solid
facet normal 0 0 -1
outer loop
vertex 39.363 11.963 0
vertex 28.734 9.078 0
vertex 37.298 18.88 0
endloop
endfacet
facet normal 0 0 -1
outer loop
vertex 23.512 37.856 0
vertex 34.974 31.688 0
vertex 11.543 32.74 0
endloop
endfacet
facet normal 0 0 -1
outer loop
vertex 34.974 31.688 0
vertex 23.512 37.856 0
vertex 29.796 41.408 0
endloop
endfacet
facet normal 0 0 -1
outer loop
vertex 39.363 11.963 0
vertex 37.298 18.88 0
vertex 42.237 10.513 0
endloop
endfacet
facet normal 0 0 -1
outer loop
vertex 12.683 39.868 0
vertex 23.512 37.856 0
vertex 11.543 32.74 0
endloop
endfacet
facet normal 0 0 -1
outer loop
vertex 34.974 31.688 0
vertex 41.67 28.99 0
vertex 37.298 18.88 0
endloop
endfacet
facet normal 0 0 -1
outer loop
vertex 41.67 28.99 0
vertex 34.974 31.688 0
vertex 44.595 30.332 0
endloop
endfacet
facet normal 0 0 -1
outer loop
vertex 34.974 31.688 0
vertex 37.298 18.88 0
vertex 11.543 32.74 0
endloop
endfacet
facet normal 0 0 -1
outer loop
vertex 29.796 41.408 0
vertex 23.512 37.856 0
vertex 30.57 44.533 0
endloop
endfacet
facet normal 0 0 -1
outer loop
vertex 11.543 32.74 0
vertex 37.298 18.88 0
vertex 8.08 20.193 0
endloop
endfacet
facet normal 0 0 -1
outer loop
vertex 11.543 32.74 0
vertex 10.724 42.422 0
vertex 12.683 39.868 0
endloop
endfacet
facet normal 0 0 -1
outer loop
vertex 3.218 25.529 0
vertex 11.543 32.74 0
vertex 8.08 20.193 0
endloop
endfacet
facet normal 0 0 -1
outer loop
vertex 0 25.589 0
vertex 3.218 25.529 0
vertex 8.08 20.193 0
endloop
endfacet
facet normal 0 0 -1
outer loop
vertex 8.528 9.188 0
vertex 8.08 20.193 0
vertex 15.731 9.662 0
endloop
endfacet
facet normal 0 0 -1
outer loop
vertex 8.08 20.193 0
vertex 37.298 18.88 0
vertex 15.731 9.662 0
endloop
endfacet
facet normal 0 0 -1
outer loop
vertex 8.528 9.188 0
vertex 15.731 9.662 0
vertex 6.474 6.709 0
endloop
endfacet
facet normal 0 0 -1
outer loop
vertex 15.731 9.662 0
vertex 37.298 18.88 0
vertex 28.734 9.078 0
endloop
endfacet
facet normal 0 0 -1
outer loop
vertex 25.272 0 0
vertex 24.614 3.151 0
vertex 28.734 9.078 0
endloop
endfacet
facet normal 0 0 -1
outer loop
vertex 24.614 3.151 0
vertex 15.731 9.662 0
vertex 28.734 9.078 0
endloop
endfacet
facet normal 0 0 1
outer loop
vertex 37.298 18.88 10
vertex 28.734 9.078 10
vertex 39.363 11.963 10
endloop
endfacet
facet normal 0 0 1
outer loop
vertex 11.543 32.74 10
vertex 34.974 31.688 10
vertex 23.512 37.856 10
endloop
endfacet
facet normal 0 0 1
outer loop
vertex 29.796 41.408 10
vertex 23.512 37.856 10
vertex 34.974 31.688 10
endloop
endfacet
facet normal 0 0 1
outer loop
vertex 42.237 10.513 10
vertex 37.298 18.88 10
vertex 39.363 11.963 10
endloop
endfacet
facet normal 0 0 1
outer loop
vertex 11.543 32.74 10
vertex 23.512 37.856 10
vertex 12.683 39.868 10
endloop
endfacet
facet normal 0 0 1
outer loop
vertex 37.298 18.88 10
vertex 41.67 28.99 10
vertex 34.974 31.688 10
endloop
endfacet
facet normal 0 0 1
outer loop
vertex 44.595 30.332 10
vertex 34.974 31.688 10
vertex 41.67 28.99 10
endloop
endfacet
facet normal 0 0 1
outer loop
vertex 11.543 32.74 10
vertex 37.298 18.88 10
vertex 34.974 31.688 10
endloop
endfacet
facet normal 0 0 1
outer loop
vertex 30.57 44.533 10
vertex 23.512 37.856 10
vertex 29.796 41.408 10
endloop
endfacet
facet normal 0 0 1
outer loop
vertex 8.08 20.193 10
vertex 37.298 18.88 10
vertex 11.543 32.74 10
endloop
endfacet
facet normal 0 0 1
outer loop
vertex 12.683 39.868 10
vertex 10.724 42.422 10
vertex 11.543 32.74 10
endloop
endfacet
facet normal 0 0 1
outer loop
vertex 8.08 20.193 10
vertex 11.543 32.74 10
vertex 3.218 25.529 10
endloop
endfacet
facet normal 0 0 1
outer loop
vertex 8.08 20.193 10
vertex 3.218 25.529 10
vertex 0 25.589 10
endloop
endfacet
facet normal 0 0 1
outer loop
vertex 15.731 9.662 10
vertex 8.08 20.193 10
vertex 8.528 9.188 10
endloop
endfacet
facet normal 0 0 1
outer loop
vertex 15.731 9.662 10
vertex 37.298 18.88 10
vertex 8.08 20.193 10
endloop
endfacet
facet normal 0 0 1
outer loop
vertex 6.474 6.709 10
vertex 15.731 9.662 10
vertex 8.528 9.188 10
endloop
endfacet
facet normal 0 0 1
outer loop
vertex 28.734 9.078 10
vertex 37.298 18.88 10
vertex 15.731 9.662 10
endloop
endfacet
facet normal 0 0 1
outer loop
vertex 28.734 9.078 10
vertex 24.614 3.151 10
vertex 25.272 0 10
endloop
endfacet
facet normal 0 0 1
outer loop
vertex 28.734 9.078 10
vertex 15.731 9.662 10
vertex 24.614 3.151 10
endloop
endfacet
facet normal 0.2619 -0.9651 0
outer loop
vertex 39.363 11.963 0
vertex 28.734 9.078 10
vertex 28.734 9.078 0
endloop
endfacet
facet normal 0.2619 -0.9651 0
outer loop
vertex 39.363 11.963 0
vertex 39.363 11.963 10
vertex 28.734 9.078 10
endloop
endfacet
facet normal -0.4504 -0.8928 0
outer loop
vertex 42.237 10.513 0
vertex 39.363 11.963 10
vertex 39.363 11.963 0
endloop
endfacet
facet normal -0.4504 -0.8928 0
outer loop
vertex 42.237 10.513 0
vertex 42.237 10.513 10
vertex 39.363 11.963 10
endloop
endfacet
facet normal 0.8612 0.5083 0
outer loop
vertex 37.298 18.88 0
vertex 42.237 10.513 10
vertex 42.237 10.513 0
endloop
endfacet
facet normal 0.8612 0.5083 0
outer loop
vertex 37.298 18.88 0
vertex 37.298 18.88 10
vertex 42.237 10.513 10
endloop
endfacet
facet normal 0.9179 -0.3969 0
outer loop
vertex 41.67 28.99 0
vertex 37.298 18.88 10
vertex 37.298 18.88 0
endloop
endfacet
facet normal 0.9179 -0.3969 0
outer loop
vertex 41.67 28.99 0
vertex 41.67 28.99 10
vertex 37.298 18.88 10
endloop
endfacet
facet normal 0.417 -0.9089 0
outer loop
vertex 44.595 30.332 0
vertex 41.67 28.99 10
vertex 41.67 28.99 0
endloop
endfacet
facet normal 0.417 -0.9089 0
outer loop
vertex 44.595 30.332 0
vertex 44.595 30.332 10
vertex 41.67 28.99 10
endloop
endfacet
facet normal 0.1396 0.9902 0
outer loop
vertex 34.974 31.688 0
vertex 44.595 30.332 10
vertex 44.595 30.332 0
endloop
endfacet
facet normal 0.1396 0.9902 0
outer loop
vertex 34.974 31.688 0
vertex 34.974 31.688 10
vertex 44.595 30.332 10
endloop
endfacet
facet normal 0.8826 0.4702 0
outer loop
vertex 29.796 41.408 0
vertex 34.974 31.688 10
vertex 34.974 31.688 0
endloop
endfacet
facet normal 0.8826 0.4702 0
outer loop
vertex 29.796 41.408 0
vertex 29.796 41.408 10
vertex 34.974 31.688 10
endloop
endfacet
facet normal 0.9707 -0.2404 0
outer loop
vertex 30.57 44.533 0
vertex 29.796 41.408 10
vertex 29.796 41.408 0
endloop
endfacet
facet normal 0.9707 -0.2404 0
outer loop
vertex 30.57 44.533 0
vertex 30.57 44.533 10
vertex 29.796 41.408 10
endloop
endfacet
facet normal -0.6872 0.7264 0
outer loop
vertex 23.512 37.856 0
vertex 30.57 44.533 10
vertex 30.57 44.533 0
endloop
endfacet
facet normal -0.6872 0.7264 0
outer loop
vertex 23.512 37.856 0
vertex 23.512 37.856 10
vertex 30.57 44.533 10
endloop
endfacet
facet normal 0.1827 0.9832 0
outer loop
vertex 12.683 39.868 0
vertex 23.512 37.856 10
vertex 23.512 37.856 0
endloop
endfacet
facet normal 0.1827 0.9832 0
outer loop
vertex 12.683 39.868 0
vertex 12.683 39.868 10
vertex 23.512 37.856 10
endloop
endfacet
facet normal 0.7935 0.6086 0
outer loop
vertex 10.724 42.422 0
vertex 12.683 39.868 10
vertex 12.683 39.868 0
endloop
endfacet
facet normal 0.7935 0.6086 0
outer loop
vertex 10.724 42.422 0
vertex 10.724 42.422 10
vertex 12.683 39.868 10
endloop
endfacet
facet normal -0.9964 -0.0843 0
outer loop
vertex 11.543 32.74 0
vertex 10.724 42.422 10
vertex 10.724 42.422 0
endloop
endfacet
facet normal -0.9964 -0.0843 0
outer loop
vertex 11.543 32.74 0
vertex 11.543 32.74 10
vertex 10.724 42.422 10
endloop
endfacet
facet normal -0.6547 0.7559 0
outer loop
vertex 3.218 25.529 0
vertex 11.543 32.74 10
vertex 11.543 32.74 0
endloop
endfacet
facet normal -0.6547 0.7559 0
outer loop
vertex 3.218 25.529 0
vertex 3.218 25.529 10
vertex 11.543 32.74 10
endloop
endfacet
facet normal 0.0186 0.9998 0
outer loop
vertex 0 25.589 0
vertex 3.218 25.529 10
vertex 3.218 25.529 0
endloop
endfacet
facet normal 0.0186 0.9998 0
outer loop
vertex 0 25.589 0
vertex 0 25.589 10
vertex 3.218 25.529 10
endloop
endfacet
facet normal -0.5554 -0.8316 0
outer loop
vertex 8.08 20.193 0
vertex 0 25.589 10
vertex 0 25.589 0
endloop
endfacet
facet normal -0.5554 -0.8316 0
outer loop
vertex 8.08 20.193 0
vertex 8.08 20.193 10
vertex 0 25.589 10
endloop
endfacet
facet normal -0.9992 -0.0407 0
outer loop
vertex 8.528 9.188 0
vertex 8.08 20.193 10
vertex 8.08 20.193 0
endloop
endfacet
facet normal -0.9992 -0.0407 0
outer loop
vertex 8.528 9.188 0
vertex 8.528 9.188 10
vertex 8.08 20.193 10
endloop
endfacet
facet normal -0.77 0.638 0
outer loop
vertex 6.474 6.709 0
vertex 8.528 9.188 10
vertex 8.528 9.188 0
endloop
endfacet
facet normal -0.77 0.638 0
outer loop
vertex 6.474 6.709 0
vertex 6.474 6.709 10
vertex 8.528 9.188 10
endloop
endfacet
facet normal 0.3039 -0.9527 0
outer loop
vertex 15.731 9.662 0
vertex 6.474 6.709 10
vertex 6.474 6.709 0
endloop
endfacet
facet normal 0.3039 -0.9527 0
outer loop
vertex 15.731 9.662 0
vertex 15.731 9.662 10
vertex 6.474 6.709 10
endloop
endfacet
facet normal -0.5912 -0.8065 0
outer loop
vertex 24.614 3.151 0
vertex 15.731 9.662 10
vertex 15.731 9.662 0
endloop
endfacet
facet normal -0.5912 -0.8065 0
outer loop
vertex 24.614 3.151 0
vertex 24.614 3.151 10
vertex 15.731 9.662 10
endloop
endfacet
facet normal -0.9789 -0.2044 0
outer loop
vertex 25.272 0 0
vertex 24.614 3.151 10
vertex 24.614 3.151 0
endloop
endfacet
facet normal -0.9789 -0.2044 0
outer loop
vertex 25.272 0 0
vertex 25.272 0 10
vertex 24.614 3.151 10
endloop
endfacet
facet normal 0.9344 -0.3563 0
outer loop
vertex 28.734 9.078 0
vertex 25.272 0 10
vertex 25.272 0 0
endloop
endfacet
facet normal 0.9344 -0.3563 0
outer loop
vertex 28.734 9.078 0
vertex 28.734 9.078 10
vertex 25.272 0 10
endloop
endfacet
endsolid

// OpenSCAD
$fn = 32;

// ----------------------------------------------------------------------
// Fan rotor section: 7 blades, 15 mm hub radius, 8 mm blades
// ----------------------------------------------------------------------

// --- parameters (mm) ---
profile_height = 10;      // extrusion height
profile_points = 21;      // points of the closed outline

profile = [[37.298, 18.88], [41.67, 28.99], [44.595, 30.332], [34.974, 31.688], [29.796, 41.408], [30.57, 44.533], [23.512, 37.856], [12.683, 39.868], [10.724, 42.422], [11.543, 32.74], [3.218, 25.529], [0, 25.589], [8.08, 20.193], [8.528, 9.188], [6.474, 6.709], [15.731, 9.662], [24.614, 3.151], [25.272, 0], [28.734, 9.078], [39.363, 11.963], [42.237, 10.513]];  // single closed polygon, 21 points, counter clockwise

// --- the one profile operation ---
linear_extrude(height = profile_height) polygon(points = profile);
